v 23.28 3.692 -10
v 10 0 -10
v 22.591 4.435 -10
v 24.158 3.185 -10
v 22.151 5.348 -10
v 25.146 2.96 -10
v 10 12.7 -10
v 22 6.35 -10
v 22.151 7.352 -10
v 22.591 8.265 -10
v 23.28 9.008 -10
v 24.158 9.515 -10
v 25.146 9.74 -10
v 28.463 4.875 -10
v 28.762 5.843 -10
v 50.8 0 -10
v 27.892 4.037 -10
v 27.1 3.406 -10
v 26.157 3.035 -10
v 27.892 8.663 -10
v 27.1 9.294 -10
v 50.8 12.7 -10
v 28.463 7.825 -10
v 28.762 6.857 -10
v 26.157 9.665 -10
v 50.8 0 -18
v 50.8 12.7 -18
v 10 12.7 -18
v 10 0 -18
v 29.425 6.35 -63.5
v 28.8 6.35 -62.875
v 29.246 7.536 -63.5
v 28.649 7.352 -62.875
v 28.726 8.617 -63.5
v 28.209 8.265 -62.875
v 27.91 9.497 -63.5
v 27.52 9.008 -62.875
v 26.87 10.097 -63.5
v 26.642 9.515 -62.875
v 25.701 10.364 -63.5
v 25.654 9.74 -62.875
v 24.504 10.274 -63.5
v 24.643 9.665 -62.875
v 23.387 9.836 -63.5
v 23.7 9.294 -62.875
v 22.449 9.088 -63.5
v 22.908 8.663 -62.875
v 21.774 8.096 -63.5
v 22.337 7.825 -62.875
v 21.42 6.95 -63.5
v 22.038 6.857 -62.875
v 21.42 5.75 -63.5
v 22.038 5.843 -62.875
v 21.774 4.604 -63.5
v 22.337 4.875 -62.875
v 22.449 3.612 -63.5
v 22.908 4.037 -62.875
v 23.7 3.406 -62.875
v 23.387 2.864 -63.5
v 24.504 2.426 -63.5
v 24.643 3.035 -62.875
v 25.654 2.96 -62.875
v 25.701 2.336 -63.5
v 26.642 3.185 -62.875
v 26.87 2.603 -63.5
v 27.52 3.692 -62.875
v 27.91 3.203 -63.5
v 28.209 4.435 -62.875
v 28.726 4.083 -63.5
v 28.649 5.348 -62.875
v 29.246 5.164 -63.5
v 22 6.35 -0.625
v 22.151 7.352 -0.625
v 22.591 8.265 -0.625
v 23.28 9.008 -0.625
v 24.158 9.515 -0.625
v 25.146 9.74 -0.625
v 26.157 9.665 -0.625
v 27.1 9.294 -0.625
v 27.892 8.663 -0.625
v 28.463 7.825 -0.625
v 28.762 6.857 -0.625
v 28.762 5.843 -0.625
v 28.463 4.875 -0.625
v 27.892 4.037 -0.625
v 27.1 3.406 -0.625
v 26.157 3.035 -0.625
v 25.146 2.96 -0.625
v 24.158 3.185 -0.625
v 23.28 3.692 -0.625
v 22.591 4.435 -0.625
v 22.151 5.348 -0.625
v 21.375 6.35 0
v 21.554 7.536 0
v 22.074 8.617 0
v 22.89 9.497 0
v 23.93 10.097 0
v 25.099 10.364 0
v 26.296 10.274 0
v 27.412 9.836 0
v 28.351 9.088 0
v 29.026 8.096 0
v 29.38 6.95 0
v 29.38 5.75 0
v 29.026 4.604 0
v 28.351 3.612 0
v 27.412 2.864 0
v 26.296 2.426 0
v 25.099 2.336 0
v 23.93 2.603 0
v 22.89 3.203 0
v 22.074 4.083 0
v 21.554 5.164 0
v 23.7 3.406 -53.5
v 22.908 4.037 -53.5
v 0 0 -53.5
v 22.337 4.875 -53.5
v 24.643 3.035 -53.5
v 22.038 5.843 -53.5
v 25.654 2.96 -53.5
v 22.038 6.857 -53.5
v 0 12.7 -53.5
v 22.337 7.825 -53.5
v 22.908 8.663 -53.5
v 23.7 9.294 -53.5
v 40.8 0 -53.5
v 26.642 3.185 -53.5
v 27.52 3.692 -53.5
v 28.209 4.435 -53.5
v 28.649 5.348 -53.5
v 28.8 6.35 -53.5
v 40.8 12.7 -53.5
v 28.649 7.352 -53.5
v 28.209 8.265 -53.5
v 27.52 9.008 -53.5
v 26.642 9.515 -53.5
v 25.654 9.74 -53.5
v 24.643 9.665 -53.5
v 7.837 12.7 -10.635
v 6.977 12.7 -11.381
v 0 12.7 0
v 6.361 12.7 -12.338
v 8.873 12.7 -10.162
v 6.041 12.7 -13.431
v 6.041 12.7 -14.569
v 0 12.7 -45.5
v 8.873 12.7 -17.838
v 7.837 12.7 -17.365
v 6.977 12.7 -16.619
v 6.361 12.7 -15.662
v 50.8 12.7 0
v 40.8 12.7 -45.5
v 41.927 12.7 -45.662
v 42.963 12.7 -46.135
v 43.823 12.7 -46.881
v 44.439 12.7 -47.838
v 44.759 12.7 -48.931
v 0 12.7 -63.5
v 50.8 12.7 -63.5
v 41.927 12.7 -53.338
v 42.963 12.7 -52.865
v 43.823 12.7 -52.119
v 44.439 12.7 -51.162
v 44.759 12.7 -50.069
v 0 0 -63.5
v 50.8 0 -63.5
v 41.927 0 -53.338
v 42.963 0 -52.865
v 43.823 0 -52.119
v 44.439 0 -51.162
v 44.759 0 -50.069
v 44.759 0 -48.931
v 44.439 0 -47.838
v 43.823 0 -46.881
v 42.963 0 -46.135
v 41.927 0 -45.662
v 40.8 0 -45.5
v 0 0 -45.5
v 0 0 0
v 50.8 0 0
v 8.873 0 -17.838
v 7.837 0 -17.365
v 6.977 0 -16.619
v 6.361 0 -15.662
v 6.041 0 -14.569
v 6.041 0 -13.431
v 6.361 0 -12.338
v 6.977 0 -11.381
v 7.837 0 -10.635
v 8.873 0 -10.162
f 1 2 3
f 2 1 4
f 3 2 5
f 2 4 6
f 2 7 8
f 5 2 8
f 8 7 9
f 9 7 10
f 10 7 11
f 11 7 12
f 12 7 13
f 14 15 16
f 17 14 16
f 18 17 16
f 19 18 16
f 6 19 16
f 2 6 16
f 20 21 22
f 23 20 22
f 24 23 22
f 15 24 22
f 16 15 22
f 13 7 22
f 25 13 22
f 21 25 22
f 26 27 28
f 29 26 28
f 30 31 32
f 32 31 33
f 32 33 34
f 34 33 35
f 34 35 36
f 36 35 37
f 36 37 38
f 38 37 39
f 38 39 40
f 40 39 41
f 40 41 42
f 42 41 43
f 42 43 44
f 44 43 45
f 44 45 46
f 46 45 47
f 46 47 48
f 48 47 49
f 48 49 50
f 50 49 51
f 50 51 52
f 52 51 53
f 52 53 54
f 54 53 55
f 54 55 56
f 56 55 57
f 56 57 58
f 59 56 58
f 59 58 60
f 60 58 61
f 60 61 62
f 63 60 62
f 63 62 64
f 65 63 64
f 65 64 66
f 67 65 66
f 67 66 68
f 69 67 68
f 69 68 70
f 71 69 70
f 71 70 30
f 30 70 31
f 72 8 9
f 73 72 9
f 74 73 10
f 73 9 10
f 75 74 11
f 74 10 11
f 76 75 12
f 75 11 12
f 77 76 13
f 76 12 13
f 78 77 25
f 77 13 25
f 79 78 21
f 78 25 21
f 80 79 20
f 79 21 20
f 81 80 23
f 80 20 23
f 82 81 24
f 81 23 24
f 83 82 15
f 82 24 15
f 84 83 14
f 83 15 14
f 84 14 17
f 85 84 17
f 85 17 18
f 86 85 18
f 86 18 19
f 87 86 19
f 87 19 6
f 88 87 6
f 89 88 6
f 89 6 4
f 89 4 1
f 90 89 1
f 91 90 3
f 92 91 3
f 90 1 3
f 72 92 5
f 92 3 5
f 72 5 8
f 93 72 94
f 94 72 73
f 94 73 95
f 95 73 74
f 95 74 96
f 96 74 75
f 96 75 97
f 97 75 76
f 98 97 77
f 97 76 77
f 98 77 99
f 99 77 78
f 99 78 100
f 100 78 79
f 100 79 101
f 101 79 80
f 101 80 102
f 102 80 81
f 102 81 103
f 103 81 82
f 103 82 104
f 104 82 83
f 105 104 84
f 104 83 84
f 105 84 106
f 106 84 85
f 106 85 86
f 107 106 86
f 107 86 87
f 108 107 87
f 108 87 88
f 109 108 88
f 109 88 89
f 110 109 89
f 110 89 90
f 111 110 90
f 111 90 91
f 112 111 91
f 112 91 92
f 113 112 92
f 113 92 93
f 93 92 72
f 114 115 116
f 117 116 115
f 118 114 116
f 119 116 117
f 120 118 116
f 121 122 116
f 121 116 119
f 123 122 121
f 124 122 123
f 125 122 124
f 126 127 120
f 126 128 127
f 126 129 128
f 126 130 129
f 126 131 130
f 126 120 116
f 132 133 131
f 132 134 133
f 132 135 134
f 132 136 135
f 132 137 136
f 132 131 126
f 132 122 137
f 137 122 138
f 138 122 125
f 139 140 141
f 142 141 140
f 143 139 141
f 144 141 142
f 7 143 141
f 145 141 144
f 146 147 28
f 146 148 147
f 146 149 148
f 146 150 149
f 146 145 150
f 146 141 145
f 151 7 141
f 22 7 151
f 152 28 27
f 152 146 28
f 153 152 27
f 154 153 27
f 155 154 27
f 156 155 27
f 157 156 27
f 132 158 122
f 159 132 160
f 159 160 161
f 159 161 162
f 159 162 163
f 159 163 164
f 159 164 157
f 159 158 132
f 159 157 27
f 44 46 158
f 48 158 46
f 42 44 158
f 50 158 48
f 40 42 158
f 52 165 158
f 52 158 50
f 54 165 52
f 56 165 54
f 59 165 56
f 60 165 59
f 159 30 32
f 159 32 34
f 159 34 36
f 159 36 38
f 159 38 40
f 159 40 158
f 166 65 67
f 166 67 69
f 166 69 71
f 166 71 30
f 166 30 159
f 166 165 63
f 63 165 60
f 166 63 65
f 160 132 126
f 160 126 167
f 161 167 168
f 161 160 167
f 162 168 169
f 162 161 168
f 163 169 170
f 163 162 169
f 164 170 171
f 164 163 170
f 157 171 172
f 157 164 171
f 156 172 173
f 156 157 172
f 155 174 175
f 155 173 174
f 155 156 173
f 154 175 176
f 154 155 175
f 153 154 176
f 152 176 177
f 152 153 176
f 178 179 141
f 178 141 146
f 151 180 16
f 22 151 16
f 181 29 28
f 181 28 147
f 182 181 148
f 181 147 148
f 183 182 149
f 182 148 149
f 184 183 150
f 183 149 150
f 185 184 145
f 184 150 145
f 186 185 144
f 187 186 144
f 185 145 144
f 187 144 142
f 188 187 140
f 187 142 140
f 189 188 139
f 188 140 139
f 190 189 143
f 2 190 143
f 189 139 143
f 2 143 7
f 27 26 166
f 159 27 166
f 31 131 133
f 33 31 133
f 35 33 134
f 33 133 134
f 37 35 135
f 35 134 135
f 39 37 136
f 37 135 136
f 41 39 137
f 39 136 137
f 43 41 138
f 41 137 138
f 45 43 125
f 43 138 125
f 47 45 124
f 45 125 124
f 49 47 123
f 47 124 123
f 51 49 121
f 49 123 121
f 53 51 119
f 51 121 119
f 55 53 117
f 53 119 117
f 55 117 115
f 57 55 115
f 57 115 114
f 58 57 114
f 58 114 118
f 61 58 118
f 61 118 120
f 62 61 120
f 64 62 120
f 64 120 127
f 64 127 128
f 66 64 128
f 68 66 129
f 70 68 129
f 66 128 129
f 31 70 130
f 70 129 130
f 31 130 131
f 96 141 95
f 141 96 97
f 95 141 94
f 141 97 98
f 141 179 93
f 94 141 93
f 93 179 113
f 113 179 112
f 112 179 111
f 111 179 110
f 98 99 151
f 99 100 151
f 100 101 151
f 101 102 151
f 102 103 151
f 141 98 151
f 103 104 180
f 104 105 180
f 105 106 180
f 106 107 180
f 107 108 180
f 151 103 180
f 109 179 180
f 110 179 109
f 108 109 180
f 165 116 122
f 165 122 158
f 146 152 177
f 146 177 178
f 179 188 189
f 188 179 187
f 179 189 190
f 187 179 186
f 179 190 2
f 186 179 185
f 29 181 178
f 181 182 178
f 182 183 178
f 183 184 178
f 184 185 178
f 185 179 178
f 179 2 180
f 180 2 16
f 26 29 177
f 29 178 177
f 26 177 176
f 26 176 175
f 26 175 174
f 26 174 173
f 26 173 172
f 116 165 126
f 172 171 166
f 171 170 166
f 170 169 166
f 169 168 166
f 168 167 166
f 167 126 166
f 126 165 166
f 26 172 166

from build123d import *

# Parameters (mm, degrees)
SKETCH1_W                        = 50.8
SKETCH1_H                        = 63.5
BOSS_EXTRUDE1_DEPTH              = 12.7
M8X1_25_TAPPED_HOLE1_D           = 6.8
M8X1_25_TAPPED_HOLE1_DEPTH       = 15
M8X1_25_TAPPED_HOLE1_CSINK_D     = 8.05
M8X1_25_TAPPED_HOLE1_CSINK_ANGLE = 90
M8X1_25_TAPPED_HOLE1_TIP         = 2.042926105
M8X1_25_TAPPED_HOLE2_D           = 6.8
M8X1_25_TAPPED_HOLE2_DEPTH       = 15
M8X1_25_TAPPED_HOLE2_CSINK_D     = 8.05
M8X1_25_TAPPED_HOLE2_CSINK_ANGLE = 90
M8X1_25_TAPPED_HOLE2_TIP         = 2.042926105
CUT_EXTRUDE1_DEPTH               = 13.7


with BuildPart() as part:
    # Sketch1 → Boss-Extrude1 (new body)
    with BuildSketch(Plane(origin=(0, 0, 0), x_dir=(1, 0, 0), z_dir=(0, 1, 0))):
        with Locations((25.4, 31.75)):
            Rectangle(SKETCH1_W, SKETCH1_H)
    extrude(amount=BOSS_EXTRUDE1_DEPTH)

    # M8x1.25 Tapped Hole1
    with Locations(Plane(origin=(0, 0, -63.5), x_dir=(-1, 0, 0), z_dir=(0, 0, -1))):
        with Locations((-25.4, 6.35)):
            CounterSinkHole(M8X1_25_TAPPED_HOLE1_D / 2, M8X1_25_TAPPED_HOLE1_CSINK_D / 2, depth=M8X1_25_TAPPED_HOLE1_DEPTH, counter_sink_angle=M8X1_25_TAPPED_HOLE1_CSINK_ANGLE)
            with Locations((0, 0, -(M8X1_25_TAPPED_HOLE1_DEPTH + M8X1_25_TAPPED_HOLE1_TIP / 2))):  # 118° drill point
                Cone(0, M8X1_25_TAPPED_HOLE1_D / 2, M8X1_25_TAPPED_HOLE1_TIP, mode=Mode.SUBTRACT)

    # M8x1.25 Tapped Hole2
    with Locations(Plane.XY):
        with Locations((25.4, 6.35)):
            CounterSinkHole(M8X1_25_TAPPED_HOLE2_D / 2, M8X1_25_TAPPED_HOLE2_CSINK_D / 2, depth=M8X1_25_TAPPED_HOLE2_DEPTH, counter_sink_angle=M8X1_25_TAPPED_HOLE2_CSINK_ANGLE)
            with Locations((0, 0, -(M8X1_25_TAPPED_HOLE2_DEPTH + M8X1_25_TAPPED_HOLE2_TIP / 2))):  # 118° drill point
                Cone(0, M8X1_25_TAPPED_HOLE2_D / 2, M8X1_25_TAPPED_HOLE2_TIP, mode=Mode.SUBTRACT)

    # Sketch9 → Cut-Extrude1 (cut, through all)
    with BuildSketch(Plane(origin=(0, 12.7, 0), x_dir=(1, 0, 0), z_dir=(0, 1, 0))):
        with BuildLine():
            Line((0, 53.5), (40.8, 53.5))
            ThreePointArc((40.8, 53.5), (44.8, 49.5), (40.8, 45.5))
            Line((40.8, 45.5), (0, 45.5))
            Line((0, 45.5), (0, 53.5))
        make_face()
        with BuildLine():
            Line((50.8, 18), (10, 18))
            ThreePointArc((10, 18), (6, 14), (10, 10))
            Line((10, 10), (50.8, 10))
            Line((50.8, 10), (50.8, 18))
        make_face()
    extrude(amount=-CUT_EXTRUDE1_DEPTH, mode=Mode.SUBTRACT)


solid = part.part
